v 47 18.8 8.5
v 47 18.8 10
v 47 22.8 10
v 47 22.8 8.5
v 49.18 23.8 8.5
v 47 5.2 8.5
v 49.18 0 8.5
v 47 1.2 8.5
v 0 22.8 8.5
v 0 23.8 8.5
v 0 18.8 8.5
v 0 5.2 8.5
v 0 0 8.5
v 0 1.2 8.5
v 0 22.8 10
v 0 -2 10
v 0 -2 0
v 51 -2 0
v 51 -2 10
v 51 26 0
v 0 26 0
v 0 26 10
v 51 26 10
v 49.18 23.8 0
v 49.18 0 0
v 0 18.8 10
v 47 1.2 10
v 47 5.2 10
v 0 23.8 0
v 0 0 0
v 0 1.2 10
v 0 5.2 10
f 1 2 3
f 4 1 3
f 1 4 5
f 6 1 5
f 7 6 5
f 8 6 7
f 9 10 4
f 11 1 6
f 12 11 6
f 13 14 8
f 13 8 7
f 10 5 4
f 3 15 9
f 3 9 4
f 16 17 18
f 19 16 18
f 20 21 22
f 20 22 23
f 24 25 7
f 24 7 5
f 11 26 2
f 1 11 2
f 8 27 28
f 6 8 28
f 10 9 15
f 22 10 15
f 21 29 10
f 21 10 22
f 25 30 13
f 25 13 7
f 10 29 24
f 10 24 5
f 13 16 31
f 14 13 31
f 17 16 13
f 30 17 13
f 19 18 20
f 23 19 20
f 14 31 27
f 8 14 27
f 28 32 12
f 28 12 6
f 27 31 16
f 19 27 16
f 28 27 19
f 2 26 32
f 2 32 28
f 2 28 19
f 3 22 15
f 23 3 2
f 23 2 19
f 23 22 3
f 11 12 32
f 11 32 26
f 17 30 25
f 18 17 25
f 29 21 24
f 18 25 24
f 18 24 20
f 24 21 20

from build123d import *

# Parameters (mm, degrees)
BOX_W           = 49.18
BOX_H           = 23.8
BOX_DEPTH       = 5
SKETCH_W        = 43.2
SKETCH_H        = 17.8
POCKET_DEPTH    = 2
SKETCH001_W     = 3
SKETCH001_H     = 9
POCKET002_DEPTH = 2
BOX001_W        = 51
BOX001_H        = 28
BOX001_DEPTH    = 10
SKETCH002_W     = 23.8
SKETCH002_H     = 5.5
POCKET003_DEPTH = 49.18
SKETCH003_W     = 47
SKETCH003_H     = 4
POCKET004_DEPTH = 5


with BuildPart() as pocket002:
    # Box → Box (new body)
    with BuildSketch(Plane.XY):
        with Locations((24.59, 11.9)):
            Rectangle(BOX_W, BOX_H)
    extrude(amount=BOX_DEPTH)

    # Sketch → Pocket (cut)
    with BuildSketch(Plane.XY.offset(5)):
        with Locations((24.6, 11.9)):
            Rectangle(SKETCH_W, SKETCH_H)
    extrude(amount=-POCKET_DEPTH, mode=Mode.SUBTRACT)

    # Sketch001 → Pocket002 (cut)
    with BuildSketch(Plane.XY.offset(5)):
        with Locations((1.5, 11.9)):
            Rectangle(SKETCH001_W, SKETCH001_H)
    extrude(amount=-POCKET002_DEPTH, mode=Mode.SUBTRACT)


with BuildPart() as pocket004:
    # Box001 → Box001 (new body)
    with BuildSketch(Plane(origin=(0, -2, 0), x_dir=(1, 0, 0), z_dir=(0, 0, 1))):
        with Locations((25.5, 14)):
            Rectangle(BOX001_W, BOX001_H)
    extrude(amount=BOX001_DEPTH)

    # Cut: cut Pocket002
    add(pocket002.part, mode=Mode.SUBTRACT)

    # Sketch002 → Pocket003 (cut)
    with BuildSketch(Plane(origin=(0, 0, 0), x_dir=(0, -1, 0), z_dir=(-1, 0, 0))):
        with Locations((-11.9, 5.75)):
            Rectangle(SKETCH002_W, SKETCH002_H)
    extrude(amount=-POCKET003_DEPTH, mode=Mode.SUBTRACT)

    # Sketch003 → Pocket004 (cut)
    with BuildSketch(Plane.XY.offset(10)):
        with Locations((23.5, 20.8)):
            Rectangle(SKETCH003_W, SKETCH003_H)
        with Locations((23.5, 3.2)):
            Rectangle(SKETCH003_W, SKETCH003_H)
    extrude(amount=-POCKET004_DEPTH, mode=Mode.SUBTRACT)


solid = pocket004.part
